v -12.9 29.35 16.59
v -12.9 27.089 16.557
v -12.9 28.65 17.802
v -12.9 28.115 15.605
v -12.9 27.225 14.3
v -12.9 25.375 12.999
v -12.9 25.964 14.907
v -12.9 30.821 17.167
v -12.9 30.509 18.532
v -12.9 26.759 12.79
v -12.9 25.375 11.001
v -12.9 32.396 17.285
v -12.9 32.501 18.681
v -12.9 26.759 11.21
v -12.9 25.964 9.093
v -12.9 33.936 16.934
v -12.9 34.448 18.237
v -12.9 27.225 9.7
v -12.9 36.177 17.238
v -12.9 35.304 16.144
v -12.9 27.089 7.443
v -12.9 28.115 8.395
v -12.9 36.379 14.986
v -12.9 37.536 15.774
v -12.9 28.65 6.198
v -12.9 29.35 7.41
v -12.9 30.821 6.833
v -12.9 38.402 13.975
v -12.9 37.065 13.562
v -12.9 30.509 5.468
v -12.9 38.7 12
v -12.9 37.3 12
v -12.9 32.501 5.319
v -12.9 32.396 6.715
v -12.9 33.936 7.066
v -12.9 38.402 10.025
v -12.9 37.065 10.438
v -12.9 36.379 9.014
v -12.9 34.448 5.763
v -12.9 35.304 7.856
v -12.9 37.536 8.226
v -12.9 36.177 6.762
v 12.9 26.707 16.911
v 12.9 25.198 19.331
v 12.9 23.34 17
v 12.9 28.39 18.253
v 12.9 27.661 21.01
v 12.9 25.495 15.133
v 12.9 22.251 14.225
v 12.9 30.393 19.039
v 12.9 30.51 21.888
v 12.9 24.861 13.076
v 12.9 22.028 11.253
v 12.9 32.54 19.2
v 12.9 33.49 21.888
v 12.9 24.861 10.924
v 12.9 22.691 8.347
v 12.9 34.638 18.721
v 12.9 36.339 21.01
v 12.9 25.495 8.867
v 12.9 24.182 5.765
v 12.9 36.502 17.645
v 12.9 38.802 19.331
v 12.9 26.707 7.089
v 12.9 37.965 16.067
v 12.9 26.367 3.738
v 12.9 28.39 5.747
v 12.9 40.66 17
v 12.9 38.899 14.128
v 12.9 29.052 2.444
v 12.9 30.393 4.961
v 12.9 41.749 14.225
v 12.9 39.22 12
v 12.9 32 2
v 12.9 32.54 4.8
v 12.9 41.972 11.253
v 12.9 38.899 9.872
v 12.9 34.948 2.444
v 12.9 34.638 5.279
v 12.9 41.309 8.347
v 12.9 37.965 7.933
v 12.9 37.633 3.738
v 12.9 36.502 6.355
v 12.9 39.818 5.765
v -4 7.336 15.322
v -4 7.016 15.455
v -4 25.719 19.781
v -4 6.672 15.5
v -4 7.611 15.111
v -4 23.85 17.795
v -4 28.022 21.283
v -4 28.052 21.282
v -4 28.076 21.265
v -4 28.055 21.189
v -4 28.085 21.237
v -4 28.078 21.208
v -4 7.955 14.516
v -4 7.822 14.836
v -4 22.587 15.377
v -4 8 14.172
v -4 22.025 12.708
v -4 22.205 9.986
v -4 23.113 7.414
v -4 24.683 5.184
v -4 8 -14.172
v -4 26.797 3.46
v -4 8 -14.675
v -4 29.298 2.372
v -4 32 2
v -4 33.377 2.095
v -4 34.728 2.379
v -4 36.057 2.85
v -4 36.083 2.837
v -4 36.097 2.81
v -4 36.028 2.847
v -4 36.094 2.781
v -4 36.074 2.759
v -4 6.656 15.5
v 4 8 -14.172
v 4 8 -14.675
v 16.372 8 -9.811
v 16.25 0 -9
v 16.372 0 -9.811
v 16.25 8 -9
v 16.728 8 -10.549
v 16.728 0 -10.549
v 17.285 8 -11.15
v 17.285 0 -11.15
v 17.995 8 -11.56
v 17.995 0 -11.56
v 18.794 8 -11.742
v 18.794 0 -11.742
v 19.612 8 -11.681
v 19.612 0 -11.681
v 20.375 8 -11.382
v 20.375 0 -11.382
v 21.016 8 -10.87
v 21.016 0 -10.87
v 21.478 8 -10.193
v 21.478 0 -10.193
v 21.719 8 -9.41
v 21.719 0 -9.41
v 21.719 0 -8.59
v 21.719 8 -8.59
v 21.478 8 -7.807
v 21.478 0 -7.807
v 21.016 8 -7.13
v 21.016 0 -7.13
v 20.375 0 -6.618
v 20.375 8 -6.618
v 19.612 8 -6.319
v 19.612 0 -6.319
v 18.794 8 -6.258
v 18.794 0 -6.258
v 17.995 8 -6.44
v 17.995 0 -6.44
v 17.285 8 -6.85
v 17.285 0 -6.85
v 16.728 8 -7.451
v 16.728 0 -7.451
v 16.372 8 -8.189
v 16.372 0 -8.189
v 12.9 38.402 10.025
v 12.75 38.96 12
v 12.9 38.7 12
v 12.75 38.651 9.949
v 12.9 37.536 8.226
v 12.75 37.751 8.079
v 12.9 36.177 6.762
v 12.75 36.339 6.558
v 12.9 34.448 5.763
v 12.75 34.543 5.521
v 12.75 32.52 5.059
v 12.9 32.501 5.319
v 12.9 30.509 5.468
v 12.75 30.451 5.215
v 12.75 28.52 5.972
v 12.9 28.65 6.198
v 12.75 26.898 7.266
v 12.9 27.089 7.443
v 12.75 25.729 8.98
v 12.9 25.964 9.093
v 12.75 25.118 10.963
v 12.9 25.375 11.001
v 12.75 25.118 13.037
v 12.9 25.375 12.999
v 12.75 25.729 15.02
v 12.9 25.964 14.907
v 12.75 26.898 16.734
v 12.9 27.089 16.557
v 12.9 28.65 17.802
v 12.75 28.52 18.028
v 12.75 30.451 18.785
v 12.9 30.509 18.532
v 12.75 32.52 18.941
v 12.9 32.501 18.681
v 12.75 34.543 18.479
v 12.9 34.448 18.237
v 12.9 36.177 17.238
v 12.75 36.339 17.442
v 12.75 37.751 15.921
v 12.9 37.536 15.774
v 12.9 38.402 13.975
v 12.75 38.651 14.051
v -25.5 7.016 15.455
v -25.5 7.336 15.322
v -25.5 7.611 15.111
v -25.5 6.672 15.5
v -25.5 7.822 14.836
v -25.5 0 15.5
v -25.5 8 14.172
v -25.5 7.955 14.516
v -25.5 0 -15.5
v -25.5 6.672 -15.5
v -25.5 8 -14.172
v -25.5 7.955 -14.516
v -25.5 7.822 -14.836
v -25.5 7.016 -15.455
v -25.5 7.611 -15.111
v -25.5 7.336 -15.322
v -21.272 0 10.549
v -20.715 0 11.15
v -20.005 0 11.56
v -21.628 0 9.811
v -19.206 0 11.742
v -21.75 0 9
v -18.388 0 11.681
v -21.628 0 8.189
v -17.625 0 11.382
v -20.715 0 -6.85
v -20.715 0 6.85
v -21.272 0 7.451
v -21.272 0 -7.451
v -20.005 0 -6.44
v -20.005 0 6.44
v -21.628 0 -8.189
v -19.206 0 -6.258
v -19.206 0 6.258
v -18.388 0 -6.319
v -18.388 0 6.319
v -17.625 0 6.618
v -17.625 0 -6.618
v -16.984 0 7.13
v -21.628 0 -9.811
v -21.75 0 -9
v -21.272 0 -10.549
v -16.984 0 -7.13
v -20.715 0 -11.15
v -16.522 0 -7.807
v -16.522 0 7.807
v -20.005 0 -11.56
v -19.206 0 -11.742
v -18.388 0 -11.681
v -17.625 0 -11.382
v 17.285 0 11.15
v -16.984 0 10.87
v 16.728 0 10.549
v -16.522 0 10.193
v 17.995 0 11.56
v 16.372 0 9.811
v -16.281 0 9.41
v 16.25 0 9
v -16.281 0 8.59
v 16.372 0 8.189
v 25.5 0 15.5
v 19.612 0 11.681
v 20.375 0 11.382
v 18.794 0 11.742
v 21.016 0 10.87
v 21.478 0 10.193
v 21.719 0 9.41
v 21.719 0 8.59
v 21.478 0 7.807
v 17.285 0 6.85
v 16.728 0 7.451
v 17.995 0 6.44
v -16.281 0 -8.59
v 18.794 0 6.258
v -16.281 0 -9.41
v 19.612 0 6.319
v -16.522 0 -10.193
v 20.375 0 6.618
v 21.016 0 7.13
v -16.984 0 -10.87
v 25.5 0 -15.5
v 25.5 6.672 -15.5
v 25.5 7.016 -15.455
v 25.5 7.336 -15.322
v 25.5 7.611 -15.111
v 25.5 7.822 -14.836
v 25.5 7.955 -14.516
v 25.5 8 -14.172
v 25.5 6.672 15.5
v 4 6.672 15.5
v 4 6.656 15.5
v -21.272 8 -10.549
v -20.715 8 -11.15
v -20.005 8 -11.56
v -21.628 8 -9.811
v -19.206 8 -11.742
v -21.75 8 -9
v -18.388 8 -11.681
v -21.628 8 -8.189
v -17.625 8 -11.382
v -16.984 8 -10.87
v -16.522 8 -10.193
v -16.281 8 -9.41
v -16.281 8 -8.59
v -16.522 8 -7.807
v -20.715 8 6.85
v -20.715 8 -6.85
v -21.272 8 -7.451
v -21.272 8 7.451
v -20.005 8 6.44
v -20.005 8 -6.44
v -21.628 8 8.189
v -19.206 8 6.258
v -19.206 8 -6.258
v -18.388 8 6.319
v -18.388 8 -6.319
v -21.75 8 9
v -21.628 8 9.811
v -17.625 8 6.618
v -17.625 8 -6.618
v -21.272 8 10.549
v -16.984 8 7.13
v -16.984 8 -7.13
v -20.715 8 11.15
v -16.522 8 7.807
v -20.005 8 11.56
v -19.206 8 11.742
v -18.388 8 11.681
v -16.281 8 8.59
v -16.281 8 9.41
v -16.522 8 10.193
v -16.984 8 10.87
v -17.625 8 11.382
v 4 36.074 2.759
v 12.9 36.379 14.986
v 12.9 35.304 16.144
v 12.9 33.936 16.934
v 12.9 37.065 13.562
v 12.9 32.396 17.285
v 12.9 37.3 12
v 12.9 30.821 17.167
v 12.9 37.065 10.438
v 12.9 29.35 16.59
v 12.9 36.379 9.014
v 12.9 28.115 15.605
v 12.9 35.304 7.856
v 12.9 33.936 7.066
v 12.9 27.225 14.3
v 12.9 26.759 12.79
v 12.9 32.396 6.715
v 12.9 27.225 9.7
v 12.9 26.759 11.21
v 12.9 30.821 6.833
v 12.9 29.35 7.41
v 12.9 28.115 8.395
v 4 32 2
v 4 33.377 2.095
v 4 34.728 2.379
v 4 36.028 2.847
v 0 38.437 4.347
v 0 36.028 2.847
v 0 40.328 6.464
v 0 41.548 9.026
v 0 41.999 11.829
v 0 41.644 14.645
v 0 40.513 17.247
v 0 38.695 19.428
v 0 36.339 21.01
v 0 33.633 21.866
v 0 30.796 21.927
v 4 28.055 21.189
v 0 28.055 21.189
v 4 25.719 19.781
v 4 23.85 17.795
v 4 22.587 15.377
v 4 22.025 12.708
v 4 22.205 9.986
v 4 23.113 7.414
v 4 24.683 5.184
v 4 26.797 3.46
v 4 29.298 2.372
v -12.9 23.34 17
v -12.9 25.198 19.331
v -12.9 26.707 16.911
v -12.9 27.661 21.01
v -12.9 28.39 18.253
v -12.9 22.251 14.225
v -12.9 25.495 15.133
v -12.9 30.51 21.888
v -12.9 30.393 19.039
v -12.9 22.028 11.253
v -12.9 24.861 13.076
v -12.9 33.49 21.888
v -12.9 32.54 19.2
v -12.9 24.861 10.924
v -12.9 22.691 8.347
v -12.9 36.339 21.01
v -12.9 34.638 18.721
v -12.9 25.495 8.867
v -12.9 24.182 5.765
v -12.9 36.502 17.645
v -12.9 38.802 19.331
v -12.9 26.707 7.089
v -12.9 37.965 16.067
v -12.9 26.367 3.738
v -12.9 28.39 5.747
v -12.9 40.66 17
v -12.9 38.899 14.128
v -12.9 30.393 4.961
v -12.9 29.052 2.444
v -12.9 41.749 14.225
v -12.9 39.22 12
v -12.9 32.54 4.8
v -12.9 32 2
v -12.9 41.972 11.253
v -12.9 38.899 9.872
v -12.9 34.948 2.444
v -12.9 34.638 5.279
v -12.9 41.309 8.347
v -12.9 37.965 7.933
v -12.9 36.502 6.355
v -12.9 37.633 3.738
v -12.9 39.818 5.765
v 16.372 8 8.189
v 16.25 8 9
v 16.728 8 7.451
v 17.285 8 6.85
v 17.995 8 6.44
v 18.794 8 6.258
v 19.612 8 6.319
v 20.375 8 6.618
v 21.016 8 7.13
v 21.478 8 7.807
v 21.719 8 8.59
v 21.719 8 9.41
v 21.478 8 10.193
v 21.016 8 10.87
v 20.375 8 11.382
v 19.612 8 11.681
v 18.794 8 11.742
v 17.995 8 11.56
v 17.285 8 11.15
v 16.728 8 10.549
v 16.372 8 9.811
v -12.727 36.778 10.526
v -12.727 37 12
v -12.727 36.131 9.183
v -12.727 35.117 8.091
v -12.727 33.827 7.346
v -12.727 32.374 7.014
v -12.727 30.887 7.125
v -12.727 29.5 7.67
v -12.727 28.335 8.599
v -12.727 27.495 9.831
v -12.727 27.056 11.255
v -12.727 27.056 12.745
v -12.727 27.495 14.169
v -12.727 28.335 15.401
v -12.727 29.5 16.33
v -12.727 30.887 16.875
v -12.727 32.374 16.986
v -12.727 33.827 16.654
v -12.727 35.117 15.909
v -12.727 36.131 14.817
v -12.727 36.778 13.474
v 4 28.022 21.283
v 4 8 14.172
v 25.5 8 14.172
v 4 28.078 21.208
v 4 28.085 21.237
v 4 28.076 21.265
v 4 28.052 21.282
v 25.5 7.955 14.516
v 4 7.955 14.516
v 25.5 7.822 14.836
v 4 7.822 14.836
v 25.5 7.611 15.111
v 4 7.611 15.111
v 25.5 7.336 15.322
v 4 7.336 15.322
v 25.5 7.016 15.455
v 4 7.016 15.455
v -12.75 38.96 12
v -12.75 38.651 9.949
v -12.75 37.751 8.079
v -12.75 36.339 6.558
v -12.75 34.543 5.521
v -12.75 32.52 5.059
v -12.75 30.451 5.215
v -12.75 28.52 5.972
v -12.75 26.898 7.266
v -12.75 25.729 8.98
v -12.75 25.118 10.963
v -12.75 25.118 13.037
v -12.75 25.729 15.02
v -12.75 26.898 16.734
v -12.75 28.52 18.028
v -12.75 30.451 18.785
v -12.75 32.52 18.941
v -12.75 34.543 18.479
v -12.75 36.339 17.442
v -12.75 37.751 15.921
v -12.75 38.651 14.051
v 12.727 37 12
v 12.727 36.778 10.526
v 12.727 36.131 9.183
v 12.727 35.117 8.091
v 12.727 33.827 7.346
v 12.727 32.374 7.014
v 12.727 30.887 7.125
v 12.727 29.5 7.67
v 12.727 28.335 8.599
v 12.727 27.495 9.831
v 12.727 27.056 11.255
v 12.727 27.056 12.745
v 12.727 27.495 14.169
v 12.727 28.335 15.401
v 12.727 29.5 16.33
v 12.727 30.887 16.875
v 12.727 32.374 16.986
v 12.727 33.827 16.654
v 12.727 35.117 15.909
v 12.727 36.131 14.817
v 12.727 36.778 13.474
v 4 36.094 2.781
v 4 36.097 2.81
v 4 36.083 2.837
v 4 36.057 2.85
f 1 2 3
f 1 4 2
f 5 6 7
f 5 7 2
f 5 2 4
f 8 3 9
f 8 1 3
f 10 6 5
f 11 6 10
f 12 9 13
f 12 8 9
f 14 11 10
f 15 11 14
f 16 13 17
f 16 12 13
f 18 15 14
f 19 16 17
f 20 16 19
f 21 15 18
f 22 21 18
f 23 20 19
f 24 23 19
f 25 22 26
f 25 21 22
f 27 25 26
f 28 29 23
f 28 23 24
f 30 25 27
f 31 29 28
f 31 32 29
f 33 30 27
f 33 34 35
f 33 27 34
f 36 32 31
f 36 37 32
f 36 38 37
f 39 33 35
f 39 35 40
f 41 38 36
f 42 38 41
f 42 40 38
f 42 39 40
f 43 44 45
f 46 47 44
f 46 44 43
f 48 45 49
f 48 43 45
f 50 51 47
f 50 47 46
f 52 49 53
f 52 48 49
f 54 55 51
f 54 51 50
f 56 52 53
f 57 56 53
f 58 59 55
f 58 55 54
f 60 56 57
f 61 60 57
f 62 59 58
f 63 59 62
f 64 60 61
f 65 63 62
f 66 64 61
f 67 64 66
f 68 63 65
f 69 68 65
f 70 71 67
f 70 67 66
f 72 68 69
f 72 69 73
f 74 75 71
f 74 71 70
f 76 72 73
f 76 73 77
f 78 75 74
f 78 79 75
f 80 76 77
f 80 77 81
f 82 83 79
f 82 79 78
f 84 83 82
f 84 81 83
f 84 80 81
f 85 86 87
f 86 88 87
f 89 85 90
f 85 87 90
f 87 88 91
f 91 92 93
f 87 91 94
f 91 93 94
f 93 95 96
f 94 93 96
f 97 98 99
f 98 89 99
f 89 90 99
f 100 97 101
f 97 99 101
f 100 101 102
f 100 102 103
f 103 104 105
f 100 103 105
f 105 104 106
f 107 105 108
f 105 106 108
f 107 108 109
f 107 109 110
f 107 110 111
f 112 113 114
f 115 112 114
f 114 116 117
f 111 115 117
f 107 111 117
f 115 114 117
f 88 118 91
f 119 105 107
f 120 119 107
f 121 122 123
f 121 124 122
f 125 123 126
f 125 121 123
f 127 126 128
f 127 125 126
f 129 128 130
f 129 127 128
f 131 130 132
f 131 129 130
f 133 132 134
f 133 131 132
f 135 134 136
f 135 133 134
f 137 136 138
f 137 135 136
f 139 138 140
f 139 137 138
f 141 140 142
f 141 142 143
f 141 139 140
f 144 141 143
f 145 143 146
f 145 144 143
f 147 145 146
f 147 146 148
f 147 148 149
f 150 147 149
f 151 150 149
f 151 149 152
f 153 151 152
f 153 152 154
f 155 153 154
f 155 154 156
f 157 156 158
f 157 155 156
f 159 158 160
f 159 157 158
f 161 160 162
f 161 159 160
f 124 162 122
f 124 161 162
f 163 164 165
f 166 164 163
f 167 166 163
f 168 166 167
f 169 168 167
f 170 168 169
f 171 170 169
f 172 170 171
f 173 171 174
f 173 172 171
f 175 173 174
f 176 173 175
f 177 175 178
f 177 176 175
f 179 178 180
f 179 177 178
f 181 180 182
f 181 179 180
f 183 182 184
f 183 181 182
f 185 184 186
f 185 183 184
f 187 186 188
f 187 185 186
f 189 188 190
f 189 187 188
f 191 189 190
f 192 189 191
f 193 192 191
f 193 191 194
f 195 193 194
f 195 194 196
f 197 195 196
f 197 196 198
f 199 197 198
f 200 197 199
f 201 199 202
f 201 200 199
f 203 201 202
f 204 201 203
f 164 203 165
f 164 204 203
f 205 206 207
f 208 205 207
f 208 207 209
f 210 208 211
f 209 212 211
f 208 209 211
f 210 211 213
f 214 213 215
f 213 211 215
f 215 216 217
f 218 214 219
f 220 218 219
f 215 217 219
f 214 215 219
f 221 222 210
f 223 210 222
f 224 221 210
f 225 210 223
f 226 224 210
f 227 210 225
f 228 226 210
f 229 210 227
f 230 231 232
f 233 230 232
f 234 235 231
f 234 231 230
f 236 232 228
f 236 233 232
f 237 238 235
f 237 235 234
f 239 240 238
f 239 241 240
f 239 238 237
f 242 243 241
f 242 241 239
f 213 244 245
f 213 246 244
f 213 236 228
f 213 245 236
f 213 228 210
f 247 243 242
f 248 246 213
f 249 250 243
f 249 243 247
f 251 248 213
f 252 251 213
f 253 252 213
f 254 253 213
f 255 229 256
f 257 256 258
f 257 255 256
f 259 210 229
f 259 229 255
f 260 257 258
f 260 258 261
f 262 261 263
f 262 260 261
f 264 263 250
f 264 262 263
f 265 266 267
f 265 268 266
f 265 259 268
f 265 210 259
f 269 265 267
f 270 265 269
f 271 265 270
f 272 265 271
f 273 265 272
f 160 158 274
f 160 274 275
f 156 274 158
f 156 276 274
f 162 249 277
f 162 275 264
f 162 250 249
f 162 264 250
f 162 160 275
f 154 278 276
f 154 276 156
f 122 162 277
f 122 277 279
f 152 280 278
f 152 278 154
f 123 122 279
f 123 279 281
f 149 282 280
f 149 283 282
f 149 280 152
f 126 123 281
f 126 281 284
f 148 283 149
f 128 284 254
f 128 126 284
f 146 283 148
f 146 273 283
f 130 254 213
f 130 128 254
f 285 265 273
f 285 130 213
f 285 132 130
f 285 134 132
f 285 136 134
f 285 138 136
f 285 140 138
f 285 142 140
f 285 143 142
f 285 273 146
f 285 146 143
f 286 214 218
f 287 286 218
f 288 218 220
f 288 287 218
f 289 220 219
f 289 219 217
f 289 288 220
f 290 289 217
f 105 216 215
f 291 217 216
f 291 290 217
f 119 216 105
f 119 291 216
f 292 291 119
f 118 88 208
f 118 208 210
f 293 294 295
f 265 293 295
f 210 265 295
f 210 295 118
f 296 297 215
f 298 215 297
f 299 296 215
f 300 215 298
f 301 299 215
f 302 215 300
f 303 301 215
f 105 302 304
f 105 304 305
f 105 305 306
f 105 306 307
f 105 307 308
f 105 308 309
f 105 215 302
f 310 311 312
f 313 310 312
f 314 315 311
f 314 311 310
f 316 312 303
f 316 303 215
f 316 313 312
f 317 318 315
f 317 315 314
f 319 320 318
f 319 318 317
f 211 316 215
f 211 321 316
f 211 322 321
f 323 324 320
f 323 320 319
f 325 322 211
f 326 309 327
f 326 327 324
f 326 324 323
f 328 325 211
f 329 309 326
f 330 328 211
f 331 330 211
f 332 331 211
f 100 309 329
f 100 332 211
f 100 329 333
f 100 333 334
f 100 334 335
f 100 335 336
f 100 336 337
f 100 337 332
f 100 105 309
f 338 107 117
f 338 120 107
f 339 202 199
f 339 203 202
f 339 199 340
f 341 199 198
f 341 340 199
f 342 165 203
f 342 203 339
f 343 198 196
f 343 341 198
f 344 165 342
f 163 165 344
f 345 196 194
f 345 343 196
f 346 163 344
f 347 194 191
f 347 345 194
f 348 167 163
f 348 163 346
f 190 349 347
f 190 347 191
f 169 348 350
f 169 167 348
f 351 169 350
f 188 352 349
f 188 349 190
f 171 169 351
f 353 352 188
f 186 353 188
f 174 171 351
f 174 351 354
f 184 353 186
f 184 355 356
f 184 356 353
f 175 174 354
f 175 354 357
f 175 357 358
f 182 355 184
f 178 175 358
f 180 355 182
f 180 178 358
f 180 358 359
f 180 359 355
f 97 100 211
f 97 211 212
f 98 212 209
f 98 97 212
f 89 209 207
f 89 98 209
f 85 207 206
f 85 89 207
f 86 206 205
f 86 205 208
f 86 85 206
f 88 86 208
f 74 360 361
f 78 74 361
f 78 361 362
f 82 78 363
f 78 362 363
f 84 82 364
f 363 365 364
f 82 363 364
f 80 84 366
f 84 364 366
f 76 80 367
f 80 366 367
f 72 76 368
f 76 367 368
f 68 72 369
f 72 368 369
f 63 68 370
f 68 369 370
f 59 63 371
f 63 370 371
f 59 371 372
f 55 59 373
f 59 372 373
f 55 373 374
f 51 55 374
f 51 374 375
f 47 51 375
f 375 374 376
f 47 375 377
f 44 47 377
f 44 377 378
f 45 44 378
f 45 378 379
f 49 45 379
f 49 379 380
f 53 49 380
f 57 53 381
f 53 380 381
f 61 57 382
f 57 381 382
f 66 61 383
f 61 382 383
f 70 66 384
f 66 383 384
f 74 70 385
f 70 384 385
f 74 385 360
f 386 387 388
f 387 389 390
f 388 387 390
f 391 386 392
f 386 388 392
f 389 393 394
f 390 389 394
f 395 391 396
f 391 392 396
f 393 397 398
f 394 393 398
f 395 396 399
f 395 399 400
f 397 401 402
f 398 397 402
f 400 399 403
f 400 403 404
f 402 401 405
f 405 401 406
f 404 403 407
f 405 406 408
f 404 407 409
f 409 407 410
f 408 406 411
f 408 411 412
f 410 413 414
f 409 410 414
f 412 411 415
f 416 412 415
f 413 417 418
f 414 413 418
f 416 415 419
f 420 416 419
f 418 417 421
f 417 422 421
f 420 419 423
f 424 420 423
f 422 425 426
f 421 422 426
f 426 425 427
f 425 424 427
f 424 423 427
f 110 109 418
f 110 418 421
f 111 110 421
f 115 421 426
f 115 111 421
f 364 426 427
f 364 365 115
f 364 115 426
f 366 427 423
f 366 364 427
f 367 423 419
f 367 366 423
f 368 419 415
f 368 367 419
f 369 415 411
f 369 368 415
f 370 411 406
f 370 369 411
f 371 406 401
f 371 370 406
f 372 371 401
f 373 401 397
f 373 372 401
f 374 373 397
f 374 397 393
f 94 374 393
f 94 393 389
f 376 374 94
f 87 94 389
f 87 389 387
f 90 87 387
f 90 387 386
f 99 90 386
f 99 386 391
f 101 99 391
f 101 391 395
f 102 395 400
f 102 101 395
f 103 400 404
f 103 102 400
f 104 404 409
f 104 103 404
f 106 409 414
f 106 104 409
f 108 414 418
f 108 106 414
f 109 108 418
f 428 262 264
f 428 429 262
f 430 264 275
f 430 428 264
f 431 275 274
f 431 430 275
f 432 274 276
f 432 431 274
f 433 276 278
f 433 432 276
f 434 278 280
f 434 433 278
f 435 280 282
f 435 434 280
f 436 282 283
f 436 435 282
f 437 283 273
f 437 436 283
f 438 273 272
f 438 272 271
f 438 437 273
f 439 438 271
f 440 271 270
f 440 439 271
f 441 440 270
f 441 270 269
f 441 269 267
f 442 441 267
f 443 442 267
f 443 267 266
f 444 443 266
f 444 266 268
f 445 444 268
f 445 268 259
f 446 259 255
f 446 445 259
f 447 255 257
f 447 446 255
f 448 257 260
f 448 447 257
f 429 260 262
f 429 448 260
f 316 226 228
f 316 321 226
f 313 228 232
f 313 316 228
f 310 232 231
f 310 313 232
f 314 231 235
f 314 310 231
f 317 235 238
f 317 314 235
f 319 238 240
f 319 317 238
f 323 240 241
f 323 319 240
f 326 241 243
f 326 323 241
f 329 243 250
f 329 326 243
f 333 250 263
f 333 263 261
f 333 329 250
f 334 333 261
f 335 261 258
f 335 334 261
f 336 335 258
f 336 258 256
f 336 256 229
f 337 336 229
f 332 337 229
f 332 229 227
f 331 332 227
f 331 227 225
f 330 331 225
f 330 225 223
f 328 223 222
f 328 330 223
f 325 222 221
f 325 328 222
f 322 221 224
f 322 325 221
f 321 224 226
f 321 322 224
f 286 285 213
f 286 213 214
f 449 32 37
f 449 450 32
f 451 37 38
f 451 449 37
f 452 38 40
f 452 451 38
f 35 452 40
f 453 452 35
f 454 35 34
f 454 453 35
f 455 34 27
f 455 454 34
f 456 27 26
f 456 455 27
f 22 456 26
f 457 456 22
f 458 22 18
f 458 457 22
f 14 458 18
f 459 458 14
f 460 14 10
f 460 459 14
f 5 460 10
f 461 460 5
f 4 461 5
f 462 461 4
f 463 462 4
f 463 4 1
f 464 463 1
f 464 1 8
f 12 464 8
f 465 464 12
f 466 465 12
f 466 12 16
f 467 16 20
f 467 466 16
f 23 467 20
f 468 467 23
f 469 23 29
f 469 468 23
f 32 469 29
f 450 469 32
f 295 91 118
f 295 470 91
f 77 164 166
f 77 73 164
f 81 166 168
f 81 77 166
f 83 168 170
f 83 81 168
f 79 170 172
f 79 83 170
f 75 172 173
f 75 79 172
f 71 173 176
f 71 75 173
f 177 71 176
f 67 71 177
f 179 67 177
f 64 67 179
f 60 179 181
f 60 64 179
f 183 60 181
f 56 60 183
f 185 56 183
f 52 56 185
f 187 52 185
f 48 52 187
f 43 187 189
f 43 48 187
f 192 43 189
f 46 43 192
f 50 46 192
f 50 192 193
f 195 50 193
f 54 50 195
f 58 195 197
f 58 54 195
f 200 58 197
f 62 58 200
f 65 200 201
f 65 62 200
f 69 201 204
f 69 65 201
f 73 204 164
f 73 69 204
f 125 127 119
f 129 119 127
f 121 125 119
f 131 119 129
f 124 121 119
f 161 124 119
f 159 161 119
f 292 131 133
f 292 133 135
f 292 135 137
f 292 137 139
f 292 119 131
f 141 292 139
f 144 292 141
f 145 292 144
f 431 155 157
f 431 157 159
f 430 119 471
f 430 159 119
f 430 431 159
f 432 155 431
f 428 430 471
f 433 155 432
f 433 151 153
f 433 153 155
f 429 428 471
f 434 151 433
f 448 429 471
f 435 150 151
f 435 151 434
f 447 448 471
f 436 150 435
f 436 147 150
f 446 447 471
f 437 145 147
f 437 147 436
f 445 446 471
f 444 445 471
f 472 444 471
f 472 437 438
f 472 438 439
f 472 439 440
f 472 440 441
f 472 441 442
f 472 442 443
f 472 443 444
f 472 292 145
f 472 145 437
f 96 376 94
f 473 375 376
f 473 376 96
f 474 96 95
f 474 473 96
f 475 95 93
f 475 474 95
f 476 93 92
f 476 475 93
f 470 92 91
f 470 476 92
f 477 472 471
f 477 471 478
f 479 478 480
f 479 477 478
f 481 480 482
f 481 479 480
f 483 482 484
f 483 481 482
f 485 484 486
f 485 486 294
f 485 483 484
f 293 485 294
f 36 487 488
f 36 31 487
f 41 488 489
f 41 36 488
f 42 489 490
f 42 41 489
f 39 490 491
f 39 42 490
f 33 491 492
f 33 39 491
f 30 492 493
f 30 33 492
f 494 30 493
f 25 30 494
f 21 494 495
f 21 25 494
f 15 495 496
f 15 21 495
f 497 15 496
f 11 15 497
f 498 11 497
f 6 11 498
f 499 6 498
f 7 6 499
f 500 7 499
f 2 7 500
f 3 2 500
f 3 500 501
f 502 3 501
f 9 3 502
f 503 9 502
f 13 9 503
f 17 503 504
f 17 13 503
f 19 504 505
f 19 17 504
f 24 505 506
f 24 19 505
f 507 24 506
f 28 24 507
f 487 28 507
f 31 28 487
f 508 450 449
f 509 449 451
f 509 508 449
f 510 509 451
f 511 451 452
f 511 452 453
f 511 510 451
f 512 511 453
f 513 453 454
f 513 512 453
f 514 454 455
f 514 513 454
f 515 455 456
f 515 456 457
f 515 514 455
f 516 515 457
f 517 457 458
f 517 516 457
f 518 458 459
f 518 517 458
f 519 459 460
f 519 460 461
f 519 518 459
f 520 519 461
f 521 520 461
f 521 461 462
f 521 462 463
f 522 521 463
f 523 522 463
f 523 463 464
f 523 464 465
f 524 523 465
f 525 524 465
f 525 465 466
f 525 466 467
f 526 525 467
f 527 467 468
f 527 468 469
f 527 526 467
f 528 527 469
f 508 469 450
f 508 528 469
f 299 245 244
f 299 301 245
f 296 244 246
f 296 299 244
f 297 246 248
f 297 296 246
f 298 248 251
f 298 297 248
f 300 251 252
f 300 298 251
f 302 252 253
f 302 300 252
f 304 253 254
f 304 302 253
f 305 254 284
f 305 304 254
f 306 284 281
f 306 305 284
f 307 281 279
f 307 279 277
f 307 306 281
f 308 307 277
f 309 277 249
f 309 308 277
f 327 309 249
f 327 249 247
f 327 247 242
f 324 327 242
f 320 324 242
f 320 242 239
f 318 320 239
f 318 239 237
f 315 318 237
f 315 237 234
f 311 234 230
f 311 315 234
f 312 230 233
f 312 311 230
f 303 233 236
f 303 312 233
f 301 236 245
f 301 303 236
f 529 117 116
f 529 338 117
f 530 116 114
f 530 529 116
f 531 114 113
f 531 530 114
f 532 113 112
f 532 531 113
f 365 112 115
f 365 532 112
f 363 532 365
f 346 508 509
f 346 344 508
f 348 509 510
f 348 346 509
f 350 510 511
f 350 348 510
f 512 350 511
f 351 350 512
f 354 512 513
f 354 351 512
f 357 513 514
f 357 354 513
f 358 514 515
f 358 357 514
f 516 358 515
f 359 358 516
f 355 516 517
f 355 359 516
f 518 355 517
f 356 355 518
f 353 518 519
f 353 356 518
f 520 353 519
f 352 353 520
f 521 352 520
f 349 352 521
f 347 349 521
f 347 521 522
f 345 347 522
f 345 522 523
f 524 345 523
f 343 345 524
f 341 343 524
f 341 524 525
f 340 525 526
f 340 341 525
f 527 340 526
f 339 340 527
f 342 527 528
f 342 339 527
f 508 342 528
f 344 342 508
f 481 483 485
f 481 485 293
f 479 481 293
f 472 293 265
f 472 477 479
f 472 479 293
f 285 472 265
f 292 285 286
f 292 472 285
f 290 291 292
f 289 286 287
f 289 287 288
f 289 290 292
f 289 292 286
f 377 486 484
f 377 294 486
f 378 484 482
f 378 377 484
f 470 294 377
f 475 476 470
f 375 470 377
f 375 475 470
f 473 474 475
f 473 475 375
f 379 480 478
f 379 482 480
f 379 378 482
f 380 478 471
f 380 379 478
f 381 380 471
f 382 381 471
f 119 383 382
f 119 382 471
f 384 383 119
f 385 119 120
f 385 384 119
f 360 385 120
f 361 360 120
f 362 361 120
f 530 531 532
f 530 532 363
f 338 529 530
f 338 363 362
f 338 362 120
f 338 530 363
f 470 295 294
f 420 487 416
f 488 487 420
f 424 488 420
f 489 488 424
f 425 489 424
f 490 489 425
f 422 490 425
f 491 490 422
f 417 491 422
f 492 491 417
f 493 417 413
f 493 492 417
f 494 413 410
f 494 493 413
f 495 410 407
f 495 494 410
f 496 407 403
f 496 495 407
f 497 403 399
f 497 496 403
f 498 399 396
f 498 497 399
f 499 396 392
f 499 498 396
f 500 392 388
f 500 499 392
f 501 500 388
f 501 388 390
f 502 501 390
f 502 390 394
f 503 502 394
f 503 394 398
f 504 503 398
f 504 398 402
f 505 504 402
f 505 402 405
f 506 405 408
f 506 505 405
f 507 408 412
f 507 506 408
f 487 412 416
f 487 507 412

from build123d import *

# Parameters (mm, degrees)
BOSS_EXTRUDE1_DEPTH      = 25.5
BOSS_EXTRUDE1_DEPTH_BACK = 25.5
BOSS_EXTRUDE2_DEPTH      = 4
BOSS_EXTRUDE2_DEPTH_BACK = 4
BOSS_EXTRUDE3_DEPTH      = 12.9
BOSS_EXTRUDE3_DEPTH_BACK = 12.9
SKETCH3_R                = 10
SKETCH4_W                = 2.75
SKETCH4_H                = 8
SKETCH5_W                = 2.75
SKETCH5_H                = 8
SKETCH6_W                = 2.75
SKETCH6_H                = 8
SKETCH7_W                = 2.75
SKETCH7_H                = 8


with BuildPart() as part:
    # Sketch1 → Boss-Extrude1 (new, two sides: drawn at the far end of the back side and taken through both)
    with BuildSketch(Plane(origin=(0, 0, 0), x_dir=(0, 0, -1), z_dir=(1, 0, 0)).offset(-BOSS_EXTRUDE1_DEPTH_BACK)):
        with BuildLine():
            Line((-15.5, 6.672), (-15.5, 0))
            Line((-15.5, 0), (15.5, 0))
            Line((15.5, 0), (15.5, 6.672))
            ThreePointArc((15.5, 6.672), (15.111037805, 7.611037805), (14.172, 8))
            Line((14.172, 8), (-14.172, 8))
            ThreePointArc((-14.172, 8), (-15.111037805, 7.611037805), (-15.5, 6.672))
        make_face()
    extrude(amount=BOSS_EXTRUDE1_DEPTH + BOSS_EXTRUDE1_DEPTH_BACK)

    # Sketch2 → Boss-Extrude2 (add, two sides: drawn at the far end of the back side and taken through both)
    with BuildSketch(Plane(origin=(0, 0, 0), x_dir=(0, 0, -1), z_dir=(1, 0, 0)).offset(-BOSS_EXTRUDE2_DEPTH_BACK)):
        with BuildLine():
            Line((-21.283175656, 28.022230556), (-15.5, 6.656))
            ThreePointArc((-15.5, 6.656), (-15.106351514, 7.606351514), (-14.156, 8))
            Line((-14.156, 8), (14.675312578, 8))
            Line((14.675312578, 8), (-2.758705731, 36.074123248))
            ThreePointArc((-2.758705731, 36.074123248), (-2.824497754, 36.091976454), (-2.846947105, 36.027607565))
            ThreePointArc((-2.846947105, 36.027607565), (-8.013665194, 22.828896751), (-21.188967498, 28.055018845))
            ThreePointArc((-21.188967498, 28.055018845), (-21.251347415, 28.082515631), (-21.283175656, 28.022230556))
        make_face()
    extrude(amount=BOSS_EXTRUDE2_DEPTH + BOSS_EXTRUDE2_DEPTH_BACK)

    # Sketch3 → Boss-Extrude3 (add, two sides: drawn at the far end of the back side and taken through both)
    with BuildSketch(Plane(origin=(0, 0, 0), x_dir=(0, 0, -1), z_dir=(1, 0, 0)).offset(-BOSS_EXTRUDE3_DEPTH_BACK)):
        with Locations((-12, 32)):
            Circle(SKETCH3_R)
    extrude(amount=BOSS_EXTRUDE3_DEPTH + BOSS_EXTRUDE3_DEPTH_BACK)

    # Sketch4 → Cut-Revolve1 (revolve, cut)
    with BuildSketch(Plane.XY.offset(9)):
        with Locations((-20.375, 4)):
            Rectangle(SKETCH4_W, SKETCH4_H)
    revolve(axis=Axis((-19, 8, 9), (0, -1, 0)), mode=Mode.SUBTRACT)

    # Sketch5 → Cut-Revolve2 (revolve, cut)
    with BuildSketch(Plane.XY.offset(9)):
        with Locations((17.625, 4)):
            Rectangle(SKETCH5_W, SKETCH5_H)
    revolve(axis=Axis((19, 8, 9), (0, -1, 0)), mode=Mode.SUBTRACT)

    # Sketch6 → Cut-Revolve3 (revolve, cut)
    with BuildSketch(Plane.XY.offset(-9)):
        with Locations((-20.375, 4)):
            Rectangle(SKETCH6_W, SKETCH6_H)
    revolve(axis=Axis((-19, 8, -9), (0, -1, 0)), mode=Mode.SUBTRACT)

    # Sketch7 → Cut-Revolve4 (revolve, cut)
    with BuildSketch(Plane.XY.offset(-9)):
        with Locations((17.625, 4)):
            Rectangle(SKETCH7_W, SKETCH7_H)
    revolve(axis=Axis((19, 8, -9), (0, -1, 0)), mode=Mode.SUBTRACT)

    # Sketch8 → Cut-Revolve5 (revolve, cut)
    with BuildSketch(Plane.XY.offset(12)):
        Polygon((-12.9, 32), (-12.9, 39.22), (-12.611324865, 38.72), (12.611324865, 38.72), (12.9, 39.22), (12.9, 32), align=None)
    revolve(axis=Axis((12.9, 32, 12), (-1, 0, 0)), mode=Mode.SUBTRACT)

    # Sketch9 → Revolve1 (revolve)
    with BuildSketch(Plane.XY.offset(12)):
        Polygon((-12.9, 37.3), (-12.726794919, 37), (12.726794919, 37), (12.9, 37.3), (12.9, 38.7), (12.726794919, 39), (-12.726794919, 39), (-12.9, 38.7), align=None)
    revolve(axis=Axis((12.9, 32, 12), (-1, 0, 0)))


solid = part.part
